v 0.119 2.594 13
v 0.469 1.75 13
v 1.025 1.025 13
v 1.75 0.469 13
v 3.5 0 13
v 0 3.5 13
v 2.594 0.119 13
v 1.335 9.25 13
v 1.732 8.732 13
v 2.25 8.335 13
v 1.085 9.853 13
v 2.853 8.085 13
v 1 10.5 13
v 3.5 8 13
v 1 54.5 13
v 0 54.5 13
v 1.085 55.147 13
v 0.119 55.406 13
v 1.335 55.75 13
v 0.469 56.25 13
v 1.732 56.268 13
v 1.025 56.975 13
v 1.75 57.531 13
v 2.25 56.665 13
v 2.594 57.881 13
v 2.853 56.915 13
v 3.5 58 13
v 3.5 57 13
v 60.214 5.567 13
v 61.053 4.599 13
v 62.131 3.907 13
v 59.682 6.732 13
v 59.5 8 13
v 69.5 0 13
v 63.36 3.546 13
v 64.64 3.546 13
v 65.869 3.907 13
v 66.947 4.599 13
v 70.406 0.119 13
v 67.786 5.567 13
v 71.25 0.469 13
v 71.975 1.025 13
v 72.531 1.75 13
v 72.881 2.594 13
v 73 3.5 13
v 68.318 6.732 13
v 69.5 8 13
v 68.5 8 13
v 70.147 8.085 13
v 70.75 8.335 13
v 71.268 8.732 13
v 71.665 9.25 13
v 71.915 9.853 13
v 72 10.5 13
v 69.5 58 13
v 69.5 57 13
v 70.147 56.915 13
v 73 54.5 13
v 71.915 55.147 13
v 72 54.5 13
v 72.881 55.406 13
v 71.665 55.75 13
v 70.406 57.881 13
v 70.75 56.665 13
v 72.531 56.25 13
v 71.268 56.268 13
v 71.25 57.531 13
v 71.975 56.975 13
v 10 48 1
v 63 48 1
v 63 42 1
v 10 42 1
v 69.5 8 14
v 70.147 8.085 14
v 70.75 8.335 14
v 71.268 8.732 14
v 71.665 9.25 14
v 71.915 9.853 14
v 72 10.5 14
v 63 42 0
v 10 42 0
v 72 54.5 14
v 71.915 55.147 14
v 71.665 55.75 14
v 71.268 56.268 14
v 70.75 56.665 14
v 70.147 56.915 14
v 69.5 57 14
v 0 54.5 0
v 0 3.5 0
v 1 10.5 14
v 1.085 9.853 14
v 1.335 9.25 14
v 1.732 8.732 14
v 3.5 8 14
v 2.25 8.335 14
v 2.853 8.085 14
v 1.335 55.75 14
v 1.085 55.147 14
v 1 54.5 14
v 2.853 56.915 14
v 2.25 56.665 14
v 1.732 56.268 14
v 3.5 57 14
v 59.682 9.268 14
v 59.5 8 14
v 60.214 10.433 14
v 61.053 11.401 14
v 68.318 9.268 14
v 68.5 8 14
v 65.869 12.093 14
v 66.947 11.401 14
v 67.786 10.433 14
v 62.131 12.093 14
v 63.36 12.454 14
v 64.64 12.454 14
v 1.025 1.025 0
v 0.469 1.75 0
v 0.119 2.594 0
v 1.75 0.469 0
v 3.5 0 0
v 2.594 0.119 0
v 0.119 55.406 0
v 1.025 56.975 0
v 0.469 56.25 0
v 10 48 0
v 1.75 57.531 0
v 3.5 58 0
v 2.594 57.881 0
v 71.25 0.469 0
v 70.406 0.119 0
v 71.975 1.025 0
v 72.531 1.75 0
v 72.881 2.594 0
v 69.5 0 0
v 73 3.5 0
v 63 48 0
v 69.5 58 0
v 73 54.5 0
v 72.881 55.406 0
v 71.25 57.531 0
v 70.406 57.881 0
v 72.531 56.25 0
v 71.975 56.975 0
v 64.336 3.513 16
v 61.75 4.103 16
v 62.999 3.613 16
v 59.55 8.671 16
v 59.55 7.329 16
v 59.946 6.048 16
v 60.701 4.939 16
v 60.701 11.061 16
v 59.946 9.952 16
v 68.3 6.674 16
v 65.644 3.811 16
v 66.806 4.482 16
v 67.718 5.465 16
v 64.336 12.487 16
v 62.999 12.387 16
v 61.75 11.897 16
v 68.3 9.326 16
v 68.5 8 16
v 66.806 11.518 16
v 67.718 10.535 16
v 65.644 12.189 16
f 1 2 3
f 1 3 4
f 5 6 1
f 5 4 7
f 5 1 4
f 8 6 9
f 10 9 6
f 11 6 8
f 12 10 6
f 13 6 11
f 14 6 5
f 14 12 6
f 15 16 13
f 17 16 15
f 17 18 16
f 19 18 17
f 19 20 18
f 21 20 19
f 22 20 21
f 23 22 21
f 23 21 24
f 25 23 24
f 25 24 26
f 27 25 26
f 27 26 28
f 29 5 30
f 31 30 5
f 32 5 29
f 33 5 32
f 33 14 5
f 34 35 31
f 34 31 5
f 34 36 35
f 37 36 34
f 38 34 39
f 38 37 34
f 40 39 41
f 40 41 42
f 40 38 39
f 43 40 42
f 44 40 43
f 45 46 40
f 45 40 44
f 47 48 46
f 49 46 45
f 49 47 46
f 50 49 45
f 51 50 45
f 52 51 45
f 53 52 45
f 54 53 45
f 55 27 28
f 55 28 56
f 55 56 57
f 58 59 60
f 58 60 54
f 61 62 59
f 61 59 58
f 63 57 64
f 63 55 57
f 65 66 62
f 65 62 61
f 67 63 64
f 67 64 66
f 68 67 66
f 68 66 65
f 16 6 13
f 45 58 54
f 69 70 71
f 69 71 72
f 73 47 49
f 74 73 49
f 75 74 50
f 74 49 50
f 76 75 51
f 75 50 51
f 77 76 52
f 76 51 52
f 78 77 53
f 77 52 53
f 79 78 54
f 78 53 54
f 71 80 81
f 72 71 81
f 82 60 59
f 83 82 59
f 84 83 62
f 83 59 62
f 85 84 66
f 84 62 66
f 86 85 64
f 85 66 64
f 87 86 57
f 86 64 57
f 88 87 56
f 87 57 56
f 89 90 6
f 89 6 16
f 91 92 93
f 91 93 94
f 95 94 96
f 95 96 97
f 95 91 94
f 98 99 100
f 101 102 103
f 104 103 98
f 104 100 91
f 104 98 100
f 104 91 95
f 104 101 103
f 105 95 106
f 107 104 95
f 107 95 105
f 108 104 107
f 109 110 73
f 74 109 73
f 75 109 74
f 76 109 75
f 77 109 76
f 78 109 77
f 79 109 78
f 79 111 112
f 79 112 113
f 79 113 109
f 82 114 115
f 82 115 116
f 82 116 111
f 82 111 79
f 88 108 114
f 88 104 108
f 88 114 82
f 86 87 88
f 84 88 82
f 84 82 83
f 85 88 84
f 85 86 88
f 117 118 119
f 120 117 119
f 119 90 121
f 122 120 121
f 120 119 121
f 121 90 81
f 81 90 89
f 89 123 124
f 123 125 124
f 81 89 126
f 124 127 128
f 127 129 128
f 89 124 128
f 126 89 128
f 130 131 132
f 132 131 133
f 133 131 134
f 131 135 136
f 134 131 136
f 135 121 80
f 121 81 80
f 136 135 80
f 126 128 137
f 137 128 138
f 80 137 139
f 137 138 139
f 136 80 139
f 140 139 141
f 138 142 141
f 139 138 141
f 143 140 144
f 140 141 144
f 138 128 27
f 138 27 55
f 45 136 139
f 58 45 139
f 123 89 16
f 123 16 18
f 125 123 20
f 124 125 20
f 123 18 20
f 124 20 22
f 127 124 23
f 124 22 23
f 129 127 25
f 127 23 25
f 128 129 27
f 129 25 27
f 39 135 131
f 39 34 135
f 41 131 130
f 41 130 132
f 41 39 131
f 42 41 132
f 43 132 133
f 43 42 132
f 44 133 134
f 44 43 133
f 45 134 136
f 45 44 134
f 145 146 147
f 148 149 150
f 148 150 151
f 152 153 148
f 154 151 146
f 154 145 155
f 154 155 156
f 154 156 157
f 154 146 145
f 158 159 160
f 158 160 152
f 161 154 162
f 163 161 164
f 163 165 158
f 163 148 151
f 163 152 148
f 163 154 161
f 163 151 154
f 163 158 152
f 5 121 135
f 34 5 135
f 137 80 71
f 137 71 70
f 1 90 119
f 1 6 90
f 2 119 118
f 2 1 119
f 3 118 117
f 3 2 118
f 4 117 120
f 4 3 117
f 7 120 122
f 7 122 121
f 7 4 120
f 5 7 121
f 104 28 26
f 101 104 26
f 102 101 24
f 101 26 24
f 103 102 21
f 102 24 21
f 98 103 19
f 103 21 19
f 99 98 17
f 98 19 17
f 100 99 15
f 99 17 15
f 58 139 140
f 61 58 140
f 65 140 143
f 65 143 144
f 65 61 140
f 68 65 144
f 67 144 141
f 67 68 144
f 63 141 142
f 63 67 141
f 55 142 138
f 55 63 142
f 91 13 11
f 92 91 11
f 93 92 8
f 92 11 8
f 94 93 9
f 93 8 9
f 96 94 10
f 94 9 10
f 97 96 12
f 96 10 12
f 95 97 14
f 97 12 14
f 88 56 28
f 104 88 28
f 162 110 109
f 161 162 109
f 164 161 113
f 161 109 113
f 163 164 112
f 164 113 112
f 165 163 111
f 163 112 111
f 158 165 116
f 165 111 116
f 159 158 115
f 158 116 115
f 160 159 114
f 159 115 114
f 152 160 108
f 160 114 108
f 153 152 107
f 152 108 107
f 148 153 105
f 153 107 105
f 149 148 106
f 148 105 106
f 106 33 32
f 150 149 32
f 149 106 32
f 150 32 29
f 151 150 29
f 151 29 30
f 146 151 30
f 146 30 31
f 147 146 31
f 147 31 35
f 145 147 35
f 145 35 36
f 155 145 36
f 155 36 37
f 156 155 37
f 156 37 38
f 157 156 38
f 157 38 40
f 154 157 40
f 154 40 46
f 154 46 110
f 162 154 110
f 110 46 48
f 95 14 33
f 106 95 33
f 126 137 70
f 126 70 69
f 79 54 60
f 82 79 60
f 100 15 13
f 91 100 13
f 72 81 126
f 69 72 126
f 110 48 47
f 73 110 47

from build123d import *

# Parameters (mm, degrees)
SKETCH1_W           = 73
SKETCH1_H           = 58
BOSS_EXTRUDE1_DEPTH = 13
FILLET1_R           = 3.5
BOSS_EXTRUDE2_DEPTH = 1
SKETCH3_R           = 4.5
BOSS_EXTRUDE3_DEPTH = 3
SKETCH6_W           = 53
SKETCH6_H           = 6
CUT_EXTRUDE2_DEPTH  = 1


with BuildPart() as part:
    # Sketch1 → Boss-Extrude1 (new body)
    with BuildSketch(Plane.XY):
        with Locations((36.5, 29)):
            Rectangle(SKETCH1_W, SKETCH1_H)
    extrude(amount=BOSS_EXTRUDE1_DEPTH)

    # Fillet1
    fillet1_edges = [part.edges().sort_by_distance(p)[0] for p in [
        (0, 58, 6.5),
        (73, 58, 6.5),
        (73, 0, 6.5),
        (0, 0, 6.5),
    ]]
    fillet(fillet1_edges, radius=FILLET1_R)

    # Sketch2 → Boss-Extrude2 (add)
    with BuildSketch(Plane.XY.offset(13)):
        with BuildLine():
            Line((3.5, 8), (69.5, 8))
            ThreePointArc((69.5, 8), (71.267766953, 8.732233047), (72, 10.5))
            Line((72, 10.5), (72, 54.5))
            ThreePointArc((72, 54.5), (71.267766953, 56.267766953), (69.5, 57))
            Line((69.5, 57), (3.5, 57))
            ThreePointArc((3.5, 57), (1.732233047, 56.267766953), (1, 54.5))
            Line((1, 54.5), (1, 10.5))
            ThreePointArc((1, 10.5), (1.732233047, 8.732233047), (3.5, 8))
        make_face()
    extrude(amount=BOSS_EXTRUDE2_DEPTH)

    # Sketch3 → Boss-Extrude3 (add)
    with BuildSketch(Plane.XY.offset(13)):
        with Locations((64, 8)):
            Circle(SKETCH3_R)
    extrude(amount=BOSS_EXTRUDE3_DEPTH)

    # Sketch6 → Cut-Extrude2 (cut)
    with BuildSketch(Plane(origin=(0, 0, 0), x_dir=(-1, 0, 0), z_dir=(0, 0, -1))):
        with Locations((-36.5, 45)):
            Rectangle(SKETCH6_W, SKETCH6_H)
    extrude(amount=-CUT_EXTRUDE2_DEPTH, mode=Mode.SUBTRACT)


solid = part.part
